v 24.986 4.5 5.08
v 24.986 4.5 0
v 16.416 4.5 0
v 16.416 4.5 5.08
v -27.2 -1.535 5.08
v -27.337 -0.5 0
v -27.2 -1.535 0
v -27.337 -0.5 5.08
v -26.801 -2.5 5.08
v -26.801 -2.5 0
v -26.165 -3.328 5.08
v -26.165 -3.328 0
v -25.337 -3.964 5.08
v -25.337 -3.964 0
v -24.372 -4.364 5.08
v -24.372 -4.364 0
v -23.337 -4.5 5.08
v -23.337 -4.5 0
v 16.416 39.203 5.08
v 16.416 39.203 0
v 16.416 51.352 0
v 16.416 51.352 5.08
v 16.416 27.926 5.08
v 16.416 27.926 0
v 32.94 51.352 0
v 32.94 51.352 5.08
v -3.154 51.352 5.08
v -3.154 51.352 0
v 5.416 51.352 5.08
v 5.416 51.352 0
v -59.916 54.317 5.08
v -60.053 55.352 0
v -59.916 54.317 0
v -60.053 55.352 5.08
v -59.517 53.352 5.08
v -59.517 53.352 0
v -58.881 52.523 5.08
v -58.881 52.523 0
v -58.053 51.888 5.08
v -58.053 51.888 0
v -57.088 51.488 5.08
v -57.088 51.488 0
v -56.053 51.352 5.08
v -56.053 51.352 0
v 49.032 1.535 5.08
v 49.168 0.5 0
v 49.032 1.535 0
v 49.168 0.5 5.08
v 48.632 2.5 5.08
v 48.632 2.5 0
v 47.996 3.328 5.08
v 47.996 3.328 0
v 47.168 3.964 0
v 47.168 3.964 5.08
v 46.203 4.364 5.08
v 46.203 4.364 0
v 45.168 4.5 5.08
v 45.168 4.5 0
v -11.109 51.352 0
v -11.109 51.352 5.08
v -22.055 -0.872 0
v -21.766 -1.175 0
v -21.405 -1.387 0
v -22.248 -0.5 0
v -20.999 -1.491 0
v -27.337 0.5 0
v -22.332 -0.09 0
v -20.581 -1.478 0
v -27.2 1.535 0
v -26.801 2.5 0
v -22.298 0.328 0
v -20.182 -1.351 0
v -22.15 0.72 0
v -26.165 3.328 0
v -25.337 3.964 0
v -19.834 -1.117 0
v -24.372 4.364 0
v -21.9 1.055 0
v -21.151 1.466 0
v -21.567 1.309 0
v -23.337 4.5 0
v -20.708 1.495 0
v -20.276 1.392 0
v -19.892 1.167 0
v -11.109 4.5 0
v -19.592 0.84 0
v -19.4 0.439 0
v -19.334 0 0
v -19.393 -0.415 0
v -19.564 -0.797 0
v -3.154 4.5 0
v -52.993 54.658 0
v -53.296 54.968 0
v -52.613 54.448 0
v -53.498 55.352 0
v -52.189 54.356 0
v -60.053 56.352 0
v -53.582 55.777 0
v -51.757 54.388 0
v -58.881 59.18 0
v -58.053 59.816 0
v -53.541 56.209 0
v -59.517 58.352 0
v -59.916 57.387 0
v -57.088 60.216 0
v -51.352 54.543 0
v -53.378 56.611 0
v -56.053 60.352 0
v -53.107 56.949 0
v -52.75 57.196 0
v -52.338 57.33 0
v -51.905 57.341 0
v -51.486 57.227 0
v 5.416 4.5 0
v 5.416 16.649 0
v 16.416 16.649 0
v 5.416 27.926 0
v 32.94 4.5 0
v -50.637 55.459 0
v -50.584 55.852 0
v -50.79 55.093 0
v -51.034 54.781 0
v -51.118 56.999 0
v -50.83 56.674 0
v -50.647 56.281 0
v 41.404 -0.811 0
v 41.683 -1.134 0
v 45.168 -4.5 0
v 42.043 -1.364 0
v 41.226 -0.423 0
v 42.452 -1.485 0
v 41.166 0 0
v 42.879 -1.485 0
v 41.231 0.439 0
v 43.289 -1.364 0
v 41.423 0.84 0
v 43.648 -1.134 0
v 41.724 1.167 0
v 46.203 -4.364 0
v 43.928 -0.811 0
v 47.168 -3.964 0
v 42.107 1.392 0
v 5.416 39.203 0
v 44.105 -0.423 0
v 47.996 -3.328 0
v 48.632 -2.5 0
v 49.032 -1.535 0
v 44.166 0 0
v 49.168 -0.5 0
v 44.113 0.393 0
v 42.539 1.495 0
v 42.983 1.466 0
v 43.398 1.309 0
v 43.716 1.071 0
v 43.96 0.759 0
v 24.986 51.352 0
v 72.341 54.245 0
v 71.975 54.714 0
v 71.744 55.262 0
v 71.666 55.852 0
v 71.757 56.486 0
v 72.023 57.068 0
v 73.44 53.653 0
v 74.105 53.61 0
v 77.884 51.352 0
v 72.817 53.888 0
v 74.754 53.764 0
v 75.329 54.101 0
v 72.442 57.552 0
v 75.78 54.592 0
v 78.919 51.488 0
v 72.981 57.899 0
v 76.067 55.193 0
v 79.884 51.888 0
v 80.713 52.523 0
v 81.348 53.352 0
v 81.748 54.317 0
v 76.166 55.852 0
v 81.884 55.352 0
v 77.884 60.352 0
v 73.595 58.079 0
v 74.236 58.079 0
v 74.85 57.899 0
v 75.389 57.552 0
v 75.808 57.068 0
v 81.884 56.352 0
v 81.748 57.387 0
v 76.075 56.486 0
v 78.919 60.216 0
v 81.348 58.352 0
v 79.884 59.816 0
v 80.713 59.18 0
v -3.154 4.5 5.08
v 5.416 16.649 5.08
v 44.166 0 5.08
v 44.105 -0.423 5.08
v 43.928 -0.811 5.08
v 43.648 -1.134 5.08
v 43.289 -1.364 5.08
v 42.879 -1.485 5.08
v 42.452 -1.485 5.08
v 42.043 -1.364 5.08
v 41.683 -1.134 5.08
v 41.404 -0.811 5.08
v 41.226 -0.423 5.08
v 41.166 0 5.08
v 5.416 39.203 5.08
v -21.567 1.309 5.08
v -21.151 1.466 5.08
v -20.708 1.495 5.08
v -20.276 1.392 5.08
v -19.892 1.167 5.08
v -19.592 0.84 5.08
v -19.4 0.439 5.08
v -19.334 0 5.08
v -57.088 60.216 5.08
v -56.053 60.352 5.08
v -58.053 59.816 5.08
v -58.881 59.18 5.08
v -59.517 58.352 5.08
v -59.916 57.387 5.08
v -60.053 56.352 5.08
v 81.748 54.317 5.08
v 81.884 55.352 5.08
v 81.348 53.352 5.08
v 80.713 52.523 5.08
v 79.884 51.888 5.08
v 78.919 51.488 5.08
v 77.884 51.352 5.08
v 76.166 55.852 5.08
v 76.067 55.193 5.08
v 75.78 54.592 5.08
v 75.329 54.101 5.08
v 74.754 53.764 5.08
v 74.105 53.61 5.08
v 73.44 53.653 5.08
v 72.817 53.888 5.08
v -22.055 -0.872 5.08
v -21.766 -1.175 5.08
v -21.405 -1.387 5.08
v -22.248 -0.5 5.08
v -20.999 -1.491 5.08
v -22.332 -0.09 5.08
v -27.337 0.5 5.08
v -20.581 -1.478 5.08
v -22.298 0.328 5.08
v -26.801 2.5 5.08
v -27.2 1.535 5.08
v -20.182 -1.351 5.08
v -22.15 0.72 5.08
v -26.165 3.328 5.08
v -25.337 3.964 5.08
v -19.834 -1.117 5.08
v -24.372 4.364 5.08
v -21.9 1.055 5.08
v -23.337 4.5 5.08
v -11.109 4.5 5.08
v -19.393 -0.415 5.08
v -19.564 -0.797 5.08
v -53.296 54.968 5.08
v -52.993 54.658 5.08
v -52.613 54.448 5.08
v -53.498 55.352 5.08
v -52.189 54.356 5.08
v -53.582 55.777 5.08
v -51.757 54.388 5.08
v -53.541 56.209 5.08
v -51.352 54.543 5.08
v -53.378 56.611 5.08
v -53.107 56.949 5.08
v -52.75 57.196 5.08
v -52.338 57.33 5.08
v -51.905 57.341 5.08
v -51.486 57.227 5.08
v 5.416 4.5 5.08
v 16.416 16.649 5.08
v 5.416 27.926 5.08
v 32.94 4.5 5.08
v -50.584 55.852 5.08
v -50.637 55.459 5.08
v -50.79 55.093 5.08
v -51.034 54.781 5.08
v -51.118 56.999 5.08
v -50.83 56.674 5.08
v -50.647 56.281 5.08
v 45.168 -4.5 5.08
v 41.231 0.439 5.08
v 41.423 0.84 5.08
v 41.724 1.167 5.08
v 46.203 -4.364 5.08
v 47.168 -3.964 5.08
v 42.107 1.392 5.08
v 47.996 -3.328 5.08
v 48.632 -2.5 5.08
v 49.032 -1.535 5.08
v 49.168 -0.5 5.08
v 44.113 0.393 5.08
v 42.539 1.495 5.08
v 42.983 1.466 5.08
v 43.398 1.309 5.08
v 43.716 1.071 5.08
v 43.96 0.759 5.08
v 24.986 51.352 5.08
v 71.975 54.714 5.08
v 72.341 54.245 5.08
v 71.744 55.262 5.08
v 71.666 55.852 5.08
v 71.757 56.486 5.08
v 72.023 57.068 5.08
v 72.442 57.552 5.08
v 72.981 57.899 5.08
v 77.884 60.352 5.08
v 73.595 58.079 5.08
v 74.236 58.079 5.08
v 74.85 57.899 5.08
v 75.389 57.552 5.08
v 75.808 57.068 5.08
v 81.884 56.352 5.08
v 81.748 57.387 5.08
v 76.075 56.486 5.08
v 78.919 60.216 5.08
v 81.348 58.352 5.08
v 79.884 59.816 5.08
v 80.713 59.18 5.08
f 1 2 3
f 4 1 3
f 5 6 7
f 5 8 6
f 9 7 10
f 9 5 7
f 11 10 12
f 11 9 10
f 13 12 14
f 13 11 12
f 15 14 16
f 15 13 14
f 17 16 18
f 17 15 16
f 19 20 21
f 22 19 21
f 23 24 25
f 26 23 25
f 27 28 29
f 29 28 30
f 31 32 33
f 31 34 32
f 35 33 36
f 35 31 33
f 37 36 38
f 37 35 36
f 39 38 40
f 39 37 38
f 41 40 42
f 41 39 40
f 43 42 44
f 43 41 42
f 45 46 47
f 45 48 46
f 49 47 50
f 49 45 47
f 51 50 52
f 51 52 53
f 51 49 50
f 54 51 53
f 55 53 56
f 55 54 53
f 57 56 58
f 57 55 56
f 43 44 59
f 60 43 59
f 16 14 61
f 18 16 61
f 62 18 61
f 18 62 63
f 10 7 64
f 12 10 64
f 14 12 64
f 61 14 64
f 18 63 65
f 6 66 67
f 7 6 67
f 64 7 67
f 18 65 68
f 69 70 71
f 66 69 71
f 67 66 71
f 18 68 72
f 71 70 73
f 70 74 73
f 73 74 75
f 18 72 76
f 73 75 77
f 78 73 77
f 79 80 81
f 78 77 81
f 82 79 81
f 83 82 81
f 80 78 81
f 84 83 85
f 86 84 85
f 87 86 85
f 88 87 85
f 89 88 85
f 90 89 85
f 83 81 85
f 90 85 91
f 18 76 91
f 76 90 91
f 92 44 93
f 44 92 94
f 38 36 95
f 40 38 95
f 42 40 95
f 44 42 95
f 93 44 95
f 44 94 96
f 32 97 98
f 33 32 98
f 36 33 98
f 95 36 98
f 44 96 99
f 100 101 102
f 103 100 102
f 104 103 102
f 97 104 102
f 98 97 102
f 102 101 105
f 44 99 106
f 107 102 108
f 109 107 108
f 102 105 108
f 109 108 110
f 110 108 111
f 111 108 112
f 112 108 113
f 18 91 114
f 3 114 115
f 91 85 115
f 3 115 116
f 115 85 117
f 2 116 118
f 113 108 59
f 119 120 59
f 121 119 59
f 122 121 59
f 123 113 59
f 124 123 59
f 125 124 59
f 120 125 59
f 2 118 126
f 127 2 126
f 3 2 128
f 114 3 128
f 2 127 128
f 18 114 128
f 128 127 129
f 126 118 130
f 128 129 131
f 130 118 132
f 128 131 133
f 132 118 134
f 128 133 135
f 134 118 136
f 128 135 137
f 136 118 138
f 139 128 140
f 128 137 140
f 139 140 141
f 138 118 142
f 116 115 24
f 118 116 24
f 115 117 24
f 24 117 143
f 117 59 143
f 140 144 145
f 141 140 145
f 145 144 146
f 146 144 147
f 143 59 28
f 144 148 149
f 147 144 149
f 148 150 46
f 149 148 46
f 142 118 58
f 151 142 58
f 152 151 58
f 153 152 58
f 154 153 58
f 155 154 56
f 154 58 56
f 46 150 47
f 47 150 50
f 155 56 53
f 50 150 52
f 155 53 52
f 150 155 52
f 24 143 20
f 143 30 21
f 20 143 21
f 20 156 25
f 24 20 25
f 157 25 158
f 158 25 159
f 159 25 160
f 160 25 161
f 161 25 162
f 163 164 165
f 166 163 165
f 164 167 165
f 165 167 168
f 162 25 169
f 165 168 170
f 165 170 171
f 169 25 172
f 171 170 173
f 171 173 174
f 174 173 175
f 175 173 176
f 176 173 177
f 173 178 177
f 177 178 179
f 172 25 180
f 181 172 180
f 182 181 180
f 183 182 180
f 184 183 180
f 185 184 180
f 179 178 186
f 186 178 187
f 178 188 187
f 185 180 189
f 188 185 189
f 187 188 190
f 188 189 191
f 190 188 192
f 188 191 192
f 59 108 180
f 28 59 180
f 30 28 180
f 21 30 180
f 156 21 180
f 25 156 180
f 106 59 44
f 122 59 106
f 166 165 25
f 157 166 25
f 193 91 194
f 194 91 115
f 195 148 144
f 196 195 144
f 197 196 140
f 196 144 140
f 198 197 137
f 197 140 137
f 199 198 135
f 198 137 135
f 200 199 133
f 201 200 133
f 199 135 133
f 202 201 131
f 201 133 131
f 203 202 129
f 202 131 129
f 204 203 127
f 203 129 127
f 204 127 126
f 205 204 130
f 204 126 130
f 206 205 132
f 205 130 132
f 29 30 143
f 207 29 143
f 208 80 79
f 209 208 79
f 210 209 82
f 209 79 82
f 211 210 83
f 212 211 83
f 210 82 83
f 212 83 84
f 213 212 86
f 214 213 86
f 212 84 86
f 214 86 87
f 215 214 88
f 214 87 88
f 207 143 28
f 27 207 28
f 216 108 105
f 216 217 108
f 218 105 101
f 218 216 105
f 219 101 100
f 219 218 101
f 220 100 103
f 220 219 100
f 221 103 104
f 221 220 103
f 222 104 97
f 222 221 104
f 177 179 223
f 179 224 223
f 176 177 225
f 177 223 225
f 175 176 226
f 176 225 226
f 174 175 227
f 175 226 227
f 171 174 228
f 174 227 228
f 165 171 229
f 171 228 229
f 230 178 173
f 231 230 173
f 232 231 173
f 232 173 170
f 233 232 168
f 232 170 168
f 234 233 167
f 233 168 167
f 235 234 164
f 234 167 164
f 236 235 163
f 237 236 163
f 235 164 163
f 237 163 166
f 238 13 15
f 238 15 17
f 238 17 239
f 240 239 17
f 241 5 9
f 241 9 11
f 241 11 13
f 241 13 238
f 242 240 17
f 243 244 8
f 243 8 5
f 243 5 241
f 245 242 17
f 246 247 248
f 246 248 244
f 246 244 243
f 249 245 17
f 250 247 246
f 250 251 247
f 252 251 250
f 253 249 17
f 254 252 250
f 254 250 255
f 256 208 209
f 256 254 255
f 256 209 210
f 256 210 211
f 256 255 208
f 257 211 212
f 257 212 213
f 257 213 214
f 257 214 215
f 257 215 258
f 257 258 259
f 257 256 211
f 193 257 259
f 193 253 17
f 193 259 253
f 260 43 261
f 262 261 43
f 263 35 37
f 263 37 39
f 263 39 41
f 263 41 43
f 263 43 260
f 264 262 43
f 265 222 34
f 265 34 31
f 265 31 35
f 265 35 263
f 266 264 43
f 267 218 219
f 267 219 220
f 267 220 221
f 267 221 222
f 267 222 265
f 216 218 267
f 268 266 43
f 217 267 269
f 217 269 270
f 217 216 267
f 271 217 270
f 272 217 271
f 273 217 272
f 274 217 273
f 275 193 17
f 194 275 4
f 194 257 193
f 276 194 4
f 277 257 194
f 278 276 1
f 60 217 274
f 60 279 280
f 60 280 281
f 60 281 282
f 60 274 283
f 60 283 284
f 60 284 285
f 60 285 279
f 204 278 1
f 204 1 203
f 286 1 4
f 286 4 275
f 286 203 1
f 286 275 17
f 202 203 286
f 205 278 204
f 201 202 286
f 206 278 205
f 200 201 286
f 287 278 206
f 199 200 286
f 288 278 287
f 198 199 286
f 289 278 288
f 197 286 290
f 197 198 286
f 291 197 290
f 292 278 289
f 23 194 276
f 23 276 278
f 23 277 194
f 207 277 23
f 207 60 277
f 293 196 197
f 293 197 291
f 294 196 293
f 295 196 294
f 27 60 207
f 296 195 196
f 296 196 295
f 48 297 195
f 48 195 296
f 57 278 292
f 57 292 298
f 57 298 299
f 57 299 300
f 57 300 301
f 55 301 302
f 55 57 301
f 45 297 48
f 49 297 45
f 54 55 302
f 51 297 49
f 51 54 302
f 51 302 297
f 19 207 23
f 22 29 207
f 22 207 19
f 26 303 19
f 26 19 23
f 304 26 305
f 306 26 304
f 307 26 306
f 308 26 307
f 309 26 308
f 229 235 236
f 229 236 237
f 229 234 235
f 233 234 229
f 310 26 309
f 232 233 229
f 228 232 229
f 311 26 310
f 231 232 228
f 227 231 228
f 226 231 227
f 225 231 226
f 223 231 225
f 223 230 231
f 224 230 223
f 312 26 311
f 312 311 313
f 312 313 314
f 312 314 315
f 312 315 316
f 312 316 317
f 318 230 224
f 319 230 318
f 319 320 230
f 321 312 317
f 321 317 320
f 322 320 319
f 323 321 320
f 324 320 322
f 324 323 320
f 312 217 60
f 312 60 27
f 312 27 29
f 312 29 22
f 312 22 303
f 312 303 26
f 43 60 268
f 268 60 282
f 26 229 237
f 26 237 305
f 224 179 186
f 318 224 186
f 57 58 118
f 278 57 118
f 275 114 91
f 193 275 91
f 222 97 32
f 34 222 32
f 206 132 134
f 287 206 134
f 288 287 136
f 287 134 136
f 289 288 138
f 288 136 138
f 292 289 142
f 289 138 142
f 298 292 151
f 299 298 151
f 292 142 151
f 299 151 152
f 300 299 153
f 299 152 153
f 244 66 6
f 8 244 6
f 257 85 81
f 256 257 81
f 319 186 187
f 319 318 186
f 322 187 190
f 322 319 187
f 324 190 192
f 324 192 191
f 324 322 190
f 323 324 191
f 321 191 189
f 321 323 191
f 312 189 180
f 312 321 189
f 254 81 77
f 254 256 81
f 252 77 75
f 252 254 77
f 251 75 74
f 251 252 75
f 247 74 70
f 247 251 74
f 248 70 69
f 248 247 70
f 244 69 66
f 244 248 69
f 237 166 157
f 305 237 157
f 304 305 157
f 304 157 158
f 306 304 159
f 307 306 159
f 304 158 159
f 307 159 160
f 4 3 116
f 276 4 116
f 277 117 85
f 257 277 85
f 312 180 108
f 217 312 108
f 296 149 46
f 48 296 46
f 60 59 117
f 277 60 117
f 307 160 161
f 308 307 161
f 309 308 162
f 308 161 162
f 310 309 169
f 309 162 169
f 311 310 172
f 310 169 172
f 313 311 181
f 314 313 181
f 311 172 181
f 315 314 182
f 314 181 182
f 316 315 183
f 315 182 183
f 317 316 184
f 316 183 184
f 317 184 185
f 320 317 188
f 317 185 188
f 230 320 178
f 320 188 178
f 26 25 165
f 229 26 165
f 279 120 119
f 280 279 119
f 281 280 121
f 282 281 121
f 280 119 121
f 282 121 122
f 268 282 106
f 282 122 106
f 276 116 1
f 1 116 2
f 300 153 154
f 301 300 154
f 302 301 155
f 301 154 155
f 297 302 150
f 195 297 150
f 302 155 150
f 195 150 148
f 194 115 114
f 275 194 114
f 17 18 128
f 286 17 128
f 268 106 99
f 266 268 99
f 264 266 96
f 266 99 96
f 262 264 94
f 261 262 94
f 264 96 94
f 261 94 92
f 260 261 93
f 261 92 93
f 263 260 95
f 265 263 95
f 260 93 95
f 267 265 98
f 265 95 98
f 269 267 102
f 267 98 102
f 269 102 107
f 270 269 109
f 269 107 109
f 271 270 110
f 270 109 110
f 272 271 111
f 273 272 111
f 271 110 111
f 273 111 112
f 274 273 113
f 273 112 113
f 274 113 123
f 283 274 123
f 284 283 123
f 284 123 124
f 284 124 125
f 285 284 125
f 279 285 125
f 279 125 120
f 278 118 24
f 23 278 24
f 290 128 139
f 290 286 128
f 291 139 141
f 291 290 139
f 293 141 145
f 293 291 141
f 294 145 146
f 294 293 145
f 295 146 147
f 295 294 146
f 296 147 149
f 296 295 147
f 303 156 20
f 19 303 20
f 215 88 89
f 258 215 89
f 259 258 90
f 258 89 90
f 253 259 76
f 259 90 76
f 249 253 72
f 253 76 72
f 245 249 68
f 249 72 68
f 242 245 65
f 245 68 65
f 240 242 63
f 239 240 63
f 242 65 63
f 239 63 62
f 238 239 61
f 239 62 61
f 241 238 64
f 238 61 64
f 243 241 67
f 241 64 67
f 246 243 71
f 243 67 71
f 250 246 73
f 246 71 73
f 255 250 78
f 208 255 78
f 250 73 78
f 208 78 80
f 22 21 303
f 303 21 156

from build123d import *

# Parameters (mm, degrees)
F1_DEPTH = 5.08
F2_R     = 4


# Not quite as in the source:
# - a feature names something its author has since deleted; it is built from what else it names


with BuildPart() as f1:
    # F0 (on Top) → F1 (new body)
    with BuildSketch(Plane.XY):
        with BuildLine():
            Line((10.9156670719, 55.8519247654), (-50.5843329281, 55.8519247654))
            ThreePointArc((-50.5843329281, 55.8519247654), (-50.7903791398, 55.0931866065), (-51.3519110531, 54.5428952787))
            Line((-51.3519110531, 54.5428952787), (-49.566514597, 51.3519247654))
            Line((-49.566514597, 51.3519247654), (-11.1088099211, 51.3519247654))
            Line((-11.1088099211, 51.3519247654), (-3.1543997556, 51.3519247654))
            Line((-3.1543997556, 51.3519247654), (5.4156670719, 51.3519247654))
            Line((5.4156670719, 51.3519247654), (10.9156670719, 51.3519247654))
            Line((10.9156670719, 51.3519247654), (10.9156670719, 55.8519247654))
        make_face()
        with BuildLine():
            Line((-11.1088099211, 4.5), (-23.3521512592, 4.5))
            Line((-23.3521512592, 4.5), (-21.5667548031, 1.3090294867))
            ThreePointArc((-21.5667548031, 1.3090294867), (-20.0755947692, 1.2939537883), (-19.3343329281, 0))
            Line((-19.3343329281, 0), (10.9156670719, 0))
            Line((10.9156670719, 0), (10.9156670719, 4.5))
            Line((10.9156670719, 4.5), (5.4156670719, 4.5))
            Line((5.4156670719, 4.5), (-3.1543997556, 4.5))
            Line((-3.1543997556, 4.5), (-11.1088099211, 4.5))
        make_face()
        with BuildLine():
            ThreePointArc((-51.3519110531, 54.5428952787), (-53.3782867164, 56.6106629243), (-50.5843329281, 55.8519247654))
            Line((-50.5843329281, 55.8519247654), (10.9156670719, 55.8519247654))
            Line((10.9156670719, 55.8519247654), (71.6656670719, 55.8519247654))
            ThreePointArc((71.6656670719, 55.8519247654), (73.9156670719, 58.1019247654), (76.1656670719, 55.8519247654))
            ThreePointArc((76.1656670719, 55.8519247654), (75.0537743102, 53.910994083), (72.8170342594, 53.8883805354))
            Line((72.8170342594, 53.8883805354), (71.3978487408, 51.3519247654))
            Line((71.3978487408, 51.3519247654), (81.8841302488, 51.3519247654))
            Line((81.8841302488, 51.3519247654), (81.8841302488, 60.3519247654))
            Line((81.8841302488, 60.3519247654), (-60.052796105, 60.3519247654))
            Line((-60.052796105, 60.3519247654), (-60.052796105, 51.3519247654))
            Line((-60.052796105, 51.3519247654), (-49.566514597, 51.3519247654))
            Line((-49.566514597, 51.3519247654), (-51.3519110531, 54.5428952787))
        make_face()
        with BuildLine():
            Line((-21.5667548031, 1.3090294867), (-23.3521512592, 4.5))
            Line((-23.3521512592, 4.5), (-27.3365851734, 4.5))
            Line((-27.3365851734, 4.5), (-27.3365851734, -4.5))
            Line((-27.3365851734, -4.5), (49.1679193172, -4.5))
            Line((49.1679193172, -4.5), (49.1679193172, 4.5))
            Line((49.1679193172, 4.5), (45.183485403, 4.5))
            Line((45.183485403, 4.5), (43.3980889469, 1.3090294867))
            ThreePointArc((43.3980889469, 1.3090294867), (43.9596208602, 0.7587381589), (44.1656670719, 0))
            ThreePointArc((44.1656670719, 0), (42.6656670719, -1.5), (41.1656670719, 0))
            Line((41.1656670719, 0), (10.9156670719, 0))
            Line((10.9156670719, 0), (-19.3343329281, 0))
            ThreePointArc((-19.3343329281, 0), (-21.593071087, -1.2939537883), (-21.5667548031, 1.3090294867))
        make_face()
        with BuildLine():
            Line((16.4156670719, 4.5), (10.9156670719, 4.5))
            Line((10.9156670719, 4.5), (10.9156670719, 0))
            Line((10.9156670719, 0), (41.1656670719, 0))
            ThreePointArc((41.1656670719, 0), (41.906928913, 1.2939537883), (43.3980889469, 1.3090294867))
            Line((43.3980889469, 1.3090294867), (45.183485403, 4.5))
            Line((45.183485403, 4.5), (32.9401440649, 4.5))
            Line((32.9401440649, 4.5), (24.9857338994, 4.5))
            Line((24.9857338994, 4.5), (16.4156670719, 4.5))
        make_face()
        with BuildLine():
            Line((71.6656670719, 55.8519247654), (10.9156670719, 55.8519247654))
            Line((10.9156670719, 55.8519247654), (10.9156670719, 51.3519247654))
            Line((10.9156670719, 51.3519247654), (16.4156670719, 51.3519247654))
            Line((16.4156670719, 51.3519247654), (24.9857338994, 51.3519247654))
            Line((24.9857338994, 51.3519247654), (32.9401440649, 51.3519247654))
            Line((32.9401440649, 51.3519247654), (71.3978487408, 51.3519247654))
            Line((71.3978487408, 51.3519247654), (72.8170342594, 53.8883805354))
            ThreePointArc((72.8170342594, 53.8883805354), (71.9747363894, 54.7138175271), (71.6656670719, 55.8519247654))
        make_face()
        Polygon((10.9156670719, 27.9259623827), (10.9156670719, 51.3519247654), (5.4156670719, 51.3519247654), (5.4156670719, 39.2025500407), (5.4156670719, 27.9259623827), align=None)
        Polygon((10.9156670719, 4.5), (10.9156670719, 27.9259623827), (5.4156670719, 27.9259623827), (5.4156670719, 16.6493747247), (5.4156670719, 4.5), align=None)
        Polygon((16.4156670719, 51.3519247654), (10.9156670719, 51.3519247654), (10.9156670719, 27.9259623827), (16.4156670719, 27.9259623827), (16.4156670719, 39.2025500407), align=None)
        Polygon((16.4156670719, 27.9259623827), (10.9156670719, 27.9259623827), (10.9156670719, 4.5), (16.4156670719, 4.5), (16.4156670719, 16.6493747247), align=None)
        Polygon((-3.1543997556, 51.3519247654), (-11.1088099211, 51.3519247654), (5.4156670719, 27.9259623827), (5.4156670719, 39.2025500407), align=None)
        Polygon((5.4156670719, 27.9259623827), (-11.1088099211, 4.5), (-3.1543997556, 4.5), (5.4156670719, 16.6493747247), align=None)
        Polygon((32.9401440649, 4.5), (16.4156670719, 27.9259623827), (16.4156670719, 16.6493747247), (24.9857338994, 4.5), align=None)
        Polygon((16.4156670719, 39.2025500407), (16.4156670719, 27.9259623827), (32.9401440649, 51.3519247654), (24.9857338994, 51.3519247654), align=None)
    extrude(amount=F1_DEPTH)

    # F2
    f2_edges = [f1.edges().sort_by_distance(p)[0] for p in [
        (-60.052796, 60.351925, 2.54),
        (-60.052796, 51.351925, 2.54),
        (81.88413, 60.351925, 2.54),
        (81.88413, 51.351925, 2.54),
        (49.167919, 4.5, 2.54),
        (49.167919, -4.5, 2.54),
        (-27.336585, 4.5, 2.54),
        (-27.336585, -4.5, 2.54),
    ]]
    fillet(f2_edges, radius=F2_R)


solid = f1.part
